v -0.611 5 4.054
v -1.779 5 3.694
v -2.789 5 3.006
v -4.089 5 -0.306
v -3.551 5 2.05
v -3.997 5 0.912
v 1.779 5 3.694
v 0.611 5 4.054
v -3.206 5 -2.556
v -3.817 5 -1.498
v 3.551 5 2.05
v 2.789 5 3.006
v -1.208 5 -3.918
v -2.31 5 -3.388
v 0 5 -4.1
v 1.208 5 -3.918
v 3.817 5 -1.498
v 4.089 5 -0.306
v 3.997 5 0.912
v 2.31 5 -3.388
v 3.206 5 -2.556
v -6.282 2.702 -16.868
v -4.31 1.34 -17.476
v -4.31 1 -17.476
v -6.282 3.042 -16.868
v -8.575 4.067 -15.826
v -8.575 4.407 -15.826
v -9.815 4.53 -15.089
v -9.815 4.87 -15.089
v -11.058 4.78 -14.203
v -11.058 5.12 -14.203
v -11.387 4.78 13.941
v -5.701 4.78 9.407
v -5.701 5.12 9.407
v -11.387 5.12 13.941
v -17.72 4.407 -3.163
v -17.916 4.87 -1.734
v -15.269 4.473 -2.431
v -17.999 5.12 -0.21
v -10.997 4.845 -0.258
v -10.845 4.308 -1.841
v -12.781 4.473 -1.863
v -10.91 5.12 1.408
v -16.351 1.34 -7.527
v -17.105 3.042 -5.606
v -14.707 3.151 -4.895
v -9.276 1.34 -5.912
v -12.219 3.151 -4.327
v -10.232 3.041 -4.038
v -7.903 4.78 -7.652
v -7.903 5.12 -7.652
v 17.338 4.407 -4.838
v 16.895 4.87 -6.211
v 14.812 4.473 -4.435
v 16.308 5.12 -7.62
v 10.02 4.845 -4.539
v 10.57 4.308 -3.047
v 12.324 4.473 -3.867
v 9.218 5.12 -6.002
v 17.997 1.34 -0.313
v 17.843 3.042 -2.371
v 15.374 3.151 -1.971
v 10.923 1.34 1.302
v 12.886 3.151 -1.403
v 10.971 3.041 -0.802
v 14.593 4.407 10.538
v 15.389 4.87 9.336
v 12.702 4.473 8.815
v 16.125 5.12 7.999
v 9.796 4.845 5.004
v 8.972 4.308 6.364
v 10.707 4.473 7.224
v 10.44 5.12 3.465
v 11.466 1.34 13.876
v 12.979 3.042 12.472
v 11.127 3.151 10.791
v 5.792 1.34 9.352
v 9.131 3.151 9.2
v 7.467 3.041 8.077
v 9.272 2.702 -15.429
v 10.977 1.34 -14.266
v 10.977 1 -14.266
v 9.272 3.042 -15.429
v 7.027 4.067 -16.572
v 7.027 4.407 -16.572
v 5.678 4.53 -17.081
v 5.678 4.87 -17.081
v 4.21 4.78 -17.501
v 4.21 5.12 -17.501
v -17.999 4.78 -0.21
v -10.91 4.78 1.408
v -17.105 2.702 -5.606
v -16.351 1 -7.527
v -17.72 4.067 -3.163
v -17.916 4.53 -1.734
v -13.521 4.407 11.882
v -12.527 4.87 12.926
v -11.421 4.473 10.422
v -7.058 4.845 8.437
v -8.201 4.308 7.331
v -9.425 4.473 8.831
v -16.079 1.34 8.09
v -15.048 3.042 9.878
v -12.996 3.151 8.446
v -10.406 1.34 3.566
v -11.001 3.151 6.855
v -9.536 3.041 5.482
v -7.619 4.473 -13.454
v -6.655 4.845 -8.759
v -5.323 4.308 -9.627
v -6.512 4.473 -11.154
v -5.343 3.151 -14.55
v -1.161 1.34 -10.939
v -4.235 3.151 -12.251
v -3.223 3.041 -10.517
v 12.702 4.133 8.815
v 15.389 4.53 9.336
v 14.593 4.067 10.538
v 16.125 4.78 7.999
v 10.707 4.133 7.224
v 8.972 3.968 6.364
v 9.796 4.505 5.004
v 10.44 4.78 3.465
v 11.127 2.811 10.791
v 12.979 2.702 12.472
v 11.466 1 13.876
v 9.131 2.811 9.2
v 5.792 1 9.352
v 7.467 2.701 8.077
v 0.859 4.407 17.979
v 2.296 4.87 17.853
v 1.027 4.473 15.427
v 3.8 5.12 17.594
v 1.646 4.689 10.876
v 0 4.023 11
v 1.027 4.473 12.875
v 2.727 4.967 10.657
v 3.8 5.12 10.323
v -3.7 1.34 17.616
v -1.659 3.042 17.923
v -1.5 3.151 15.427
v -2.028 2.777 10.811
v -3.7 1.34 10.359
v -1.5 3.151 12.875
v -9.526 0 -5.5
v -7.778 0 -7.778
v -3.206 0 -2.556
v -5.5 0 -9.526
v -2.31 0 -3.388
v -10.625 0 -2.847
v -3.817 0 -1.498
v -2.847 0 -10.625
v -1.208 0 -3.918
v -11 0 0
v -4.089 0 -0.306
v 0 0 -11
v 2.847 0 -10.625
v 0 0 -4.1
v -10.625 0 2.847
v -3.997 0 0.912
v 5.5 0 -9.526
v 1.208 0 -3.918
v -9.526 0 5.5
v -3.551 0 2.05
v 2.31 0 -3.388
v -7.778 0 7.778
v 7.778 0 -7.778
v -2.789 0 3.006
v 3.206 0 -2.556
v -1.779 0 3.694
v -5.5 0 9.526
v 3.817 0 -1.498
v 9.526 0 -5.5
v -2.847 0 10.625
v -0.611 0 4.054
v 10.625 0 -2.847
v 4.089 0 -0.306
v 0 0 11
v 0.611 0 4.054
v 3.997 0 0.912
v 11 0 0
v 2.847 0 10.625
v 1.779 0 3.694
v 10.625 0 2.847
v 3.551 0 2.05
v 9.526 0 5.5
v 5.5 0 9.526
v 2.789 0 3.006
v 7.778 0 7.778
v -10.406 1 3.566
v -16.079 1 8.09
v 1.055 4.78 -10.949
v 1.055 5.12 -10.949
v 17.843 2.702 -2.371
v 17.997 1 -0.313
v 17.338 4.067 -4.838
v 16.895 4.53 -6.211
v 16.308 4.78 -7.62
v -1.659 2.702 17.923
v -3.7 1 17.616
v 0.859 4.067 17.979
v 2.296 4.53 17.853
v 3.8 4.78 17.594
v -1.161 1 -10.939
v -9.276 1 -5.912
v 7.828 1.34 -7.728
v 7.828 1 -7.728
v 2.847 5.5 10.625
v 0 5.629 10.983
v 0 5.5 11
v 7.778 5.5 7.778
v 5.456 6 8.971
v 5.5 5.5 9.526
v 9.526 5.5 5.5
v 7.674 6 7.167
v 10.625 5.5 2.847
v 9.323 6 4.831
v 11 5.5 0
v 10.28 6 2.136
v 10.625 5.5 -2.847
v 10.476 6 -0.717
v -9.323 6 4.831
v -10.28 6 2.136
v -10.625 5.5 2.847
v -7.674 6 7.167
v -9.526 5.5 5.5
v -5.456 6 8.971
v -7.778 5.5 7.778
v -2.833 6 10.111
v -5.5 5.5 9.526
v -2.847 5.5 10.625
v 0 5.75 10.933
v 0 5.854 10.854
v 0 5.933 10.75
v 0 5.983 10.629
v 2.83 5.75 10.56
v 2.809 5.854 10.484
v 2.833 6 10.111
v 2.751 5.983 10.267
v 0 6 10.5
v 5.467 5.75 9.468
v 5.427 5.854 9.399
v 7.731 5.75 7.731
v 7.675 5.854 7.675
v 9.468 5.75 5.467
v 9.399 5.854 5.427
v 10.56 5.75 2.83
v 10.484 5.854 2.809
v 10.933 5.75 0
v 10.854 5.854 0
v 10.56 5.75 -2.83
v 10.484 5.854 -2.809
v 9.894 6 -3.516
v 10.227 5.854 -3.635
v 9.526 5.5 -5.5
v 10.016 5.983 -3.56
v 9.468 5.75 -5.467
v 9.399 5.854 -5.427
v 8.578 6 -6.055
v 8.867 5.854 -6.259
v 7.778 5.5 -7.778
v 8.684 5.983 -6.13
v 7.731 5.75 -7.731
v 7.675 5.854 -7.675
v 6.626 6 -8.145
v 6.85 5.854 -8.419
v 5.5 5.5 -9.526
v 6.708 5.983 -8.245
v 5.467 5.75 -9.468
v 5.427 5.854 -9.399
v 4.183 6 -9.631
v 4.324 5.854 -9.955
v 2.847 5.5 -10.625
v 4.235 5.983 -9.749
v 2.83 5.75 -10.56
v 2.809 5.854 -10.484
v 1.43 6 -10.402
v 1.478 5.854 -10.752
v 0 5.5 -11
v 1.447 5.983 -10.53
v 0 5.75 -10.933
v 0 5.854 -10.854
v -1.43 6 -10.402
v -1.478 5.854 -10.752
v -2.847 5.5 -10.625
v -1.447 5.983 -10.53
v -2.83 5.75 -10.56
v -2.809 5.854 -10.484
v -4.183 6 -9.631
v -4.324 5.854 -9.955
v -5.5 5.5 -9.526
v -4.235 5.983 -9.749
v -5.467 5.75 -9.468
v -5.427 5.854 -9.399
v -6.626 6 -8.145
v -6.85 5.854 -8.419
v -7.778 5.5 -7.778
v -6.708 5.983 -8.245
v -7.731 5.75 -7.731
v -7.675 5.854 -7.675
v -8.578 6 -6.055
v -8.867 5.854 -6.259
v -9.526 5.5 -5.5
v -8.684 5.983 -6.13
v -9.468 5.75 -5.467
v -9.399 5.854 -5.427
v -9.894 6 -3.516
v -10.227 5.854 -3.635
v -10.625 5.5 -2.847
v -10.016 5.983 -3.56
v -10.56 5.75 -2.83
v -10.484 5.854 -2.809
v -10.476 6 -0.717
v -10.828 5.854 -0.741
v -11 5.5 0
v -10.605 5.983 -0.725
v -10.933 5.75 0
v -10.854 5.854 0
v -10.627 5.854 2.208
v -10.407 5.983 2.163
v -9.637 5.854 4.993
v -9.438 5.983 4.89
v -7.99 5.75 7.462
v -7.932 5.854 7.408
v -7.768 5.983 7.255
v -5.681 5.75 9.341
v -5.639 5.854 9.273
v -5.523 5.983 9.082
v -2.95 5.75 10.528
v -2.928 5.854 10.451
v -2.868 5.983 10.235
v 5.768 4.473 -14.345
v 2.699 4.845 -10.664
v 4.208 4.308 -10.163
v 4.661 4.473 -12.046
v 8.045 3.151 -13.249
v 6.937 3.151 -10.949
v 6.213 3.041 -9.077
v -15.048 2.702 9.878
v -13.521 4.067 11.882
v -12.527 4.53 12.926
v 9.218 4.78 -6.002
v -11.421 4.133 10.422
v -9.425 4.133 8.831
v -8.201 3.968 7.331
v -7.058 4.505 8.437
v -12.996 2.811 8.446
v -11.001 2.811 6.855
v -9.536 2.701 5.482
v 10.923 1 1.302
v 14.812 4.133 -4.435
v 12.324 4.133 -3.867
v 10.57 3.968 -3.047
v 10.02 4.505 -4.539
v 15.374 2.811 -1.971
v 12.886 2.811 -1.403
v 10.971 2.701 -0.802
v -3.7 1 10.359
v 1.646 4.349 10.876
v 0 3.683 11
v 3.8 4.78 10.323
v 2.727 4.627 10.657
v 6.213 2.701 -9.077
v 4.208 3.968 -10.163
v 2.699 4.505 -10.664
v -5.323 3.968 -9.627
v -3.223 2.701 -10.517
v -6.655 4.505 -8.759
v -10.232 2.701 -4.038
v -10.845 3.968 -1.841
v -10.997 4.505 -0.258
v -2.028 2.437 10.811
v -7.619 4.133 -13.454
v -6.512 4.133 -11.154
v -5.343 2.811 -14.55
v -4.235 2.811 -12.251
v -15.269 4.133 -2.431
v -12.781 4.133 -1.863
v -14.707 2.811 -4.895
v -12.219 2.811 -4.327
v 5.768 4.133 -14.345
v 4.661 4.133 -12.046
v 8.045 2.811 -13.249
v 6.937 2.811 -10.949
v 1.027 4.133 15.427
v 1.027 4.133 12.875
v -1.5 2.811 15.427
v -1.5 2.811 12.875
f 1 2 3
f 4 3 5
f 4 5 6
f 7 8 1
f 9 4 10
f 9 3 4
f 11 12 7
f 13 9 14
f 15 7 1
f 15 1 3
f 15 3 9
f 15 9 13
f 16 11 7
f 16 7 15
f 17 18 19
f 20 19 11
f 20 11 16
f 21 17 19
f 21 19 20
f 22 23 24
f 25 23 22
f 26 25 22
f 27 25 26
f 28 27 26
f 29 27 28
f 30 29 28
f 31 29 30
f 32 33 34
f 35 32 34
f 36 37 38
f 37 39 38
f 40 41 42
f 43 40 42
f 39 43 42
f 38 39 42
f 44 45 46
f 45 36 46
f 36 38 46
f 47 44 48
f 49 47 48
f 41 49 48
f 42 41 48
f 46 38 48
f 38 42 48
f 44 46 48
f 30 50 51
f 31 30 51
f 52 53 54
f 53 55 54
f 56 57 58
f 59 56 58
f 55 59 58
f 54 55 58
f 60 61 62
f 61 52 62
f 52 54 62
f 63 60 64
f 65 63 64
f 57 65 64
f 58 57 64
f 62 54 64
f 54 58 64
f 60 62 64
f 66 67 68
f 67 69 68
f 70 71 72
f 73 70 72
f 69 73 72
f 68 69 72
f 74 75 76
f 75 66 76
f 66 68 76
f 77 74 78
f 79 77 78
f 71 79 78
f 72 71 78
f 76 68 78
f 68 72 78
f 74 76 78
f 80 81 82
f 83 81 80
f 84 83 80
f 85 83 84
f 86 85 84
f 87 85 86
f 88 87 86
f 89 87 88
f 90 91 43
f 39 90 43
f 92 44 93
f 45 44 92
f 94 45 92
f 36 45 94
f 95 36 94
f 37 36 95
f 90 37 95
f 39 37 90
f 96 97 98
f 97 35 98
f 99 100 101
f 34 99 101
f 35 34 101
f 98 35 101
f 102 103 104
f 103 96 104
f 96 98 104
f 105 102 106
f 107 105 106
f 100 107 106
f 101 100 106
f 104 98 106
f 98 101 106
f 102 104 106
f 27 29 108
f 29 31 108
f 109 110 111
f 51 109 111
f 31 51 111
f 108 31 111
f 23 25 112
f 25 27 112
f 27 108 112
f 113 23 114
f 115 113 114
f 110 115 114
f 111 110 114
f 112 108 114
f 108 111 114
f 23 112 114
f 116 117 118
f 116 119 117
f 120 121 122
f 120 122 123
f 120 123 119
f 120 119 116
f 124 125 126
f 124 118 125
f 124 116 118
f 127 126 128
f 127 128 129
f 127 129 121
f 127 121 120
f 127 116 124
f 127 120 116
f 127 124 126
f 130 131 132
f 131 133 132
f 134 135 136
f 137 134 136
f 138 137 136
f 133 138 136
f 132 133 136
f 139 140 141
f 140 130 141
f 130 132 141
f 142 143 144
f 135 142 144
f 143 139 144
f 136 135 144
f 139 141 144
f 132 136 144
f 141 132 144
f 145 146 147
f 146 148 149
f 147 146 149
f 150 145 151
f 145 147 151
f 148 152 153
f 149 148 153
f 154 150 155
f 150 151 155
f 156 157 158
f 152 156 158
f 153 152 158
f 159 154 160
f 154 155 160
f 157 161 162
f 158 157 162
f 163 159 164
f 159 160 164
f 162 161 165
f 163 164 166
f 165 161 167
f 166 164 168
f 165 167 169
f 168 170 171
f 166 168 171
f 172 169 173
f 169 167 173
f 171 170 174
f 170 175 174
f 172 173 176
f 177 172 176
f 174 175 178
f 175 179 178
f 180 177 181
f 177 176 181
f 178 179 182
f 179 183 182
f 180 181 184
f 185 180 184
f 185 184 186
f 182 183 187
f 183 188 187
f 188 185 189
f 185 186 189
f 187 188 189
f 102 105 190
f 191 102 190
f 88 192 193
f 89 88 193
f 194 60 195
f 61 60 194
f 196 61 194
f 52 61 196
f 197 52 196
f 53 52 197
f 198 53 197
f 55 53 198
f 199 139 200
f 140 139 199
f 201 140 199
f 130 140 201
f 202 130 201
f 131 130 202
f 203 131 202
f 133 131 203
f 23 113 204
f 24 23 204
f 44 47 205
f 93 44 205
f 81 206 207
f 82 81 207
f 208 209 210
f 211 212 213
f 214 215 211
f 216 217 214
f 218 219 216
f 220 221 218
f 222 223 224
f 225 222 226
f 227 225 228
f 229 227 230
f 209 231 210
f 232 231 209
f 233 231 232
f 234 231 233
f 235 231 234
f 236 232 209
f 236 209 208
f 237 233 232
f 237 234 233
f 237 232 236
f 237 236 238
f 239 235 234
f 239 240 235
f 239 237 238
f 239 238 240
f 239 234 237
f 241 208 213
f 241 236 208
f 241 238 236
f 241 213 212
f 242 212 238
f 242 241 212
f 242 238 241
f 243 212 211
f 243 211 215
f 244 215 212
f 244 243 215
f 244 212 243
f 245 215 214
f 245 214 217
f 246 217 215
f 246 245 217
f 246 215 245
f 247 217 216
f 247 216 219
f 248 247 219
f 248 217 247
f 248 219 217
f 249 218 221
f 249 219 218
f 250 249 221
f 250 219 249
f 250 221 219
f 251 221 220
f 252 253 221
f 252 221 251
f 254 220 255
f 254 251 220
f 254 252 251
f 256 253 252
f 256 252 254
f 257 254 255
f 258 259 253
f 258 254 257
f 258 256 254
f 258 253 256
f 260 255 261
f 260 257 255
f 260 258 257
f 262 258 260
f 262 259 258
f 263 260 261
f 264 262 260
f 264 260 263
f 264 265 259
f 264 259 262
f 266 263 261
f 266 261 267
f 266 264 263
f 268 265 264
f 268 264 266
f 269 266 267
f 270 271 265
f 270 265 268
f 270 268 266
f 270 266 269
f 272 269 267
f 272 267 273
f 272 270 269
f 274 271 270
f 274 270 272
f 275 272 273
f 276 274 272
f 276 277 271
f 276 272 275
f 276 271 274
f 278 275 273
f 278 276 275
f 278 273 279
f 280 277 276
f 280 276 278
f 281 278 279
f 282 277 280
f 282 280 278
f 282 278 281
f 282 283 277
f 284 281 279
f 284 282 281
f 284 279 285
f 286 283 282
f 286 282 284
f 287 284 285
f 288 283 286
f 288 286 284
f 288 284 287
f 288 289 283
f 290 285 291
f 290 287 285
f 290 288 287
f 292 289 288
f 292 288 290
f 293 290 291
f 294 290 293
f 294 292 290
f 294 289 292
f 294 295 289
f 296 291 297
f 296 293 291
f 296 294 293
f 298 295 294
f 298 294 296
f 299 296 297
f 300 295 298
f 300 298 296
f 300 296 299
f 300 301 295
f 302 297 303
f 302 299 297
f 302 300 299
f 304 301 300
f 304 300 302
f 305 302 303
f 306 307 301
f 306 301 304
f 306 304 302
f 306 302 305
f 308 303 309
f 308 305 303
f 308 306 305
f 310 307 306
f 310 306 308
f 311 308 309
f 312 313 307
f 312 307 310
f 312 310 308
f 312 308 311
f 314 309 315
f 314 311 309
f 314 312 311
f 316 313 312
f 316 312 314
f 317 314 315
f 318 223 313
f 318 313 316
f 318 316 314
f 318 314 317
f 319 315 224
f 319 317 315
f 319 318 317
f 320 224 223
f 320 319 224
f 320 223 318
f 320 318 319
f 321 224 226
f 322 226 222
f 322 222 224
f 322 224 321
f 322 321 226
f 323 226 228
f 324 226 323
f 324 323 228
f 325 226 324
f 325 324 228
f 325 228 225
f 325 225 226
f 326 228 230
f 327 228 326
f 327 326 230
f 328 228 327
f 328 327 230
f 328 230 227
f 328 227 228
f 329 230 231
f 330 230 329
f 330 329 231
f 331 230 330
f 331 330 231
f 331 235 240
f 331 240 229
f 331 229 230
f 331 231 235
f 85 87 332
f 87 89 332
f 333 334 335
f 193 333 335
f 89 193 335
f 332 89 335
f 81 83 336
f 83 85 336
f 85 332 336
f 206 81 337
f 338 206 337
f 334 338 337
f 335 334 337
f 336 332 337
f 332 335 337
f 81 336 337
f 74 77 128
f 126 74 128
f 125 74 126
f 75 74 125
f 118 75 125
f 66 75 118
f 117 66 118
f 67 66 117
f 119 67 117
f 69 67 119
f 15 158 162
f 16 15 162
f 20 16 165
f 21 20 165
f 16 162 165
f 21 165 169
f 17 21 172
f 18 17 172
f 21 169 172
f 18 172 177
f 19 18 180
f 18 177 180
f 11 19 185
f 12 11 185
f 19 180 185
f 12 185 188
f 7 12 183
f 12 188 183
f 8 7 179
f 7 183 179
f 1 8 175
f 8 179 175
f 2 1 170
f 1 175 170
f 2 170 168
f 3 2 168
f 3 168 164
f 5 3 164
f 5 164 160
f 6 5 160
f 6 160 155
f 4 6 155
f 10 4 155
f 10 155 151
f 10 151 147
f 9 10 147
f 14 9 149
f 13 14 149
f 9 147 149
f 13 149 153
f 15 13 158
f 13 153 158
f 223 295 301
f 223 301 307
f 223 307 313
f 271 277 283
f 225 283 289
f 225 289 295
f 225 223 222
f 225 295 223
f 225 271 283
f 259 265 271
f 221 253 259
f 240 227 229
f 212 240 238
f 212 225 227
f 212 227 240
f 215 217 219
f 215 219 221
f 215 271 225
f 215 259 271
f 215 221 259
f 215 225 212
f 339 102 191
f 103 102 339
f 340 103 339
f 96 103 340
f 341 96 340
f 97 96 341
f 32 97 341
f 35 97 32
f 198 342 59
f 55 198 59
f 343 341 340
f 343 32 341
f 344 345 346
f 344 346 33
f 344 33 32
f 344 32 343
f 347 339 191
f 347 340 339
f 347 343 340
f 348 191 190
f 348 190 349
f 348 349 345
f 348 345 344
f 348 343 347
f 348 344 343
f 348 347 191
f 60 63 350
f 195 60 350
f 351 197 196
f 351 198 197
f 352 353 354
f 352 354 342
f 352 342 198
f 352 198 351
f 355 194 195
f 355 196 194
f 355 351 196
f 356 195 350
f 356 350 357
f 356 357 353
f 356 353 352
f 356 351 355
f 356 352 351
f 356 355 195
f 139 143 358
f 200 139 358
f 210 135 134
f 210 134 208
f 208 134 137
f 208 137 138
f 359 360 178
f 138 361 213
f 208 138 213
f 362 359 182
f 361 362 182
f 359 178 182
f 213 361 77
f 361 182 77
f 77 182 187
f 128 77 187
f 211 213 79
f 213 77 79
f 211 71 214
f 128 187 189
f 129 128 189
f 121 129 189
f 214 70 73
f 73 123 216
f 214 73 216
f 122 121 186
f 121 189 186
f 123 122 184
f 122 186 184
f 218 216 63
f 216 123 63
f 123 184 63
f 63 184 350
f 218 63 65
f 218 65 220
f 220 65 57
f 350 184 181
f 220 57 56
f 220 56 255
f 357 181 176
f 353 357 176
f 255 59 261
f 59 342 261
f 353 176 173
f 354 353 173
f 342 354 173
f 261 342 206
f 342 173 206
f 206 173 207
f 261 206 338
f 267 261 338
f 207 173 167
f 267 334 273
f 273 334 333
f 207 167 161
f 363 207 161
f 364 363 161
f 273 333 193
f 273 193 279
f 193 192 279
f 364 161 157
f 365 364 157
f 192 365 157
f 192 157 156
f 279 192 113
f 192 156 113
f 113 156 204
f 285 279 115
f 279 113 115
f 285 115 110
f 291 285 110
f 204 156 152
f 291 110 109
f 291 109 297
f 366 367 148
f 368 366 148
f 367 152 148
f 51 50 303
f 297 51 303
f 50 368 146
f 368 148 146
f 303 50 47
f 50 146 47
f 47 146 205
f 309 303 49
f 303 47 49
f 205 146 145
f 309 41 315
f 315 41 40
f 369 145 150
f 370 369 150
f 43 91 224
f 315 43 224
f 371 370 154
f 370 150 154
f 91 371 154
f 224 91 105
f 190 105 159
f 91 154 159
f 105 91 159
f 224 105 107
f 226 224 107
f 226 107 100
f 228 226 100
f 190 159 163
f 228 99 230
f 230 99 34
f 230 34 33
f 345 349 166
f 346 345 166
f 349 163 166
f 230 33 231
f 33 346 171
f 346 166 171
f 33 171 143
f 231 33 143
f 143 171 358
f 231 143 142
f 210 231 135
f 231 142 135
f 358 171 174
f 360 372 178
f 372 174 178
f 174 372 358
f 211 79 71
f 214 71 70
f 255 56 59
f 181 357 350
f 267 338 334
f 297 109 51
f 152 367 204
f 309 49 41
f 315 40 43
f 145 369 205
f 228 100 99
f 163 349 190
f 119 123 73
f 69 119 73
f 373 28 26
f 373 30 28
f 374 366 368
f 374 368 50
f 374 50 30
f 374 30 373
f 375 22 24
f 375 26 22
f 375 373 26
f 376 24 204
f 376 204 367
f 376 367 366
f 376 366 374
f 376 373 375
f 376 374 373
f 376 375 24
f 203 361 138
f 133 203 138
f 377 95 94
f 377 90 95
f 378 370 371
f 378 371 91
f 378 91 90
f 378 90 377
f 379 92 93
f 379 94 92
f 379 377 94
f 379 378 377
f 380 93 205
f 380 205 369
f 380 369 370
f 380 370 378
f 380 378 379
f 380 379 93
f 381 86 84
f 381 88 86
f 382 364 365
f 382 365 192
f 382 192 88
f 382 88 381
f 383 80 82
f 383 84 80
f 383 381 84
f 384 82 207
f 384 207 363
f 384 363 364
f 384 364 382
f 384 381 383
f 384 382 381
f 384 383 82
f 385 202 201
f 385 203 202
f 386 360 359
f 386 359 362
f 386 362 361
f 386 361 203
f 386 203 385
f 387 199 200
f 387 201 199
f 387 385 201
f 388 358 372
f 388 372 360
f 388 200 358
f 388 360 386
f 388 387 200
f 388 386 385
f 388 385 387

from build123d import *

# Parameters (mm, degrees)
SKETCH_1_R               = 11
EXTRUDE_1_DEPTH          = 6
EXTRUDE_2_DEPTH          = 25
PATTERN_CIRCULAR_1_COUNT = 7
SKETCH_4_R               = 35
SKETCH_4_R_2             = 18
CUT_EXTRUDE_2_DEPTH      = 25
FILLET_1_R               = 0.5
SKETCH_2_R               = 4.1
CUT_EXTRUDE_1_DEPTH      = 5


with BuildPart() as part:
    # Эскиз1 → Бобышка-Вытянуть1 (new body)
    with BuildSketch(Plane(origin=(0, 0, 0), x_dir=(1, 0, 0), z_dir=(0, 1, 0))):
        with Locations(Location((0, 0, 0), (0, 0, 270))):
            Circle(SKETCH_1_R)
    extrude(amount=EXTRUDE_1_DEPTH)

    # Эскиз3 → Бобышка-Вытянуть2 (add)
    with BuildSketch(Plane.XY):
        with BuildLine():
            Line((-3.7, 1.34), (-3.7, 1))
            add(Edge.make_bspline(
                [(3.8, 4.78), (0.931582196, 4.533244366), (-1.689682262, 2.992121942), (-3.7, 1)],
                knots=[0, 0, 0, 0, 1, 1, 1, 1], degree=3))
            Line((3.8, 4.78), (3.8, 5.12))
            add(Edge.make_bspline(
                [(3.8, 5.12), (0.931582196, 4.873244366), (-1.689682262, 3.332121942), (-3.7, 1.34)],
                knots=[0, 0, 0, 0, 1, 1, 1, 1], degree=3))
        make_face()
    extrude_2 = extrude(amount=EXTRUDE_2_DEPTH)

    # Круговой массив1: Бобышка-Вытянуть2 ×7 about axis
    pattern_circular_1_axis = Axis((0, 6, 0), (0, 1, 0))
    for i in range(1, PATTERN_CIRCULAR_1_COUNT):
        add(extrude_2.rotate(pattern_circular_1_axis, i * 360 / PATTERN_CIRCULAR_1_COUNT))

    # Эскиз4 → Вырез-Вытянуть2 (cut)
    with BuildSketch(Plane(origin=(0, 6, 0), x_dir=(1, 0, 0), z_dir=(0, 1, 0))):
        Circle(SKETCH_4_R)
        Circle(SKETCH_4_R_2, mode=Mode.SUBTRACT)
    extrude(amount=-CUT_EXTRUDE_2_DEPTH, mode=Mode.SUBTRACT)

    # Скругление1
    fillet_1_edges = [part.edges().sort_by_distance(p)[0] for p in [
        (0, 6, -11),
    ]]
    fillet(fillet_1_edges, radius=FILLET_1_R)

    # Эскиз2 → Вырез-Вытянуть1 (cut)
    with BuildSketch(Plane.XZ):
        with Locations(Location((0, 0, 0), (0, 0, 270))):
            Circle(SKETCH_2_R)
    extrude(amount=-CUT_EXTRUDE_1_DEPTH, mode=Mode.SUBTRACT)


solid = part.part
